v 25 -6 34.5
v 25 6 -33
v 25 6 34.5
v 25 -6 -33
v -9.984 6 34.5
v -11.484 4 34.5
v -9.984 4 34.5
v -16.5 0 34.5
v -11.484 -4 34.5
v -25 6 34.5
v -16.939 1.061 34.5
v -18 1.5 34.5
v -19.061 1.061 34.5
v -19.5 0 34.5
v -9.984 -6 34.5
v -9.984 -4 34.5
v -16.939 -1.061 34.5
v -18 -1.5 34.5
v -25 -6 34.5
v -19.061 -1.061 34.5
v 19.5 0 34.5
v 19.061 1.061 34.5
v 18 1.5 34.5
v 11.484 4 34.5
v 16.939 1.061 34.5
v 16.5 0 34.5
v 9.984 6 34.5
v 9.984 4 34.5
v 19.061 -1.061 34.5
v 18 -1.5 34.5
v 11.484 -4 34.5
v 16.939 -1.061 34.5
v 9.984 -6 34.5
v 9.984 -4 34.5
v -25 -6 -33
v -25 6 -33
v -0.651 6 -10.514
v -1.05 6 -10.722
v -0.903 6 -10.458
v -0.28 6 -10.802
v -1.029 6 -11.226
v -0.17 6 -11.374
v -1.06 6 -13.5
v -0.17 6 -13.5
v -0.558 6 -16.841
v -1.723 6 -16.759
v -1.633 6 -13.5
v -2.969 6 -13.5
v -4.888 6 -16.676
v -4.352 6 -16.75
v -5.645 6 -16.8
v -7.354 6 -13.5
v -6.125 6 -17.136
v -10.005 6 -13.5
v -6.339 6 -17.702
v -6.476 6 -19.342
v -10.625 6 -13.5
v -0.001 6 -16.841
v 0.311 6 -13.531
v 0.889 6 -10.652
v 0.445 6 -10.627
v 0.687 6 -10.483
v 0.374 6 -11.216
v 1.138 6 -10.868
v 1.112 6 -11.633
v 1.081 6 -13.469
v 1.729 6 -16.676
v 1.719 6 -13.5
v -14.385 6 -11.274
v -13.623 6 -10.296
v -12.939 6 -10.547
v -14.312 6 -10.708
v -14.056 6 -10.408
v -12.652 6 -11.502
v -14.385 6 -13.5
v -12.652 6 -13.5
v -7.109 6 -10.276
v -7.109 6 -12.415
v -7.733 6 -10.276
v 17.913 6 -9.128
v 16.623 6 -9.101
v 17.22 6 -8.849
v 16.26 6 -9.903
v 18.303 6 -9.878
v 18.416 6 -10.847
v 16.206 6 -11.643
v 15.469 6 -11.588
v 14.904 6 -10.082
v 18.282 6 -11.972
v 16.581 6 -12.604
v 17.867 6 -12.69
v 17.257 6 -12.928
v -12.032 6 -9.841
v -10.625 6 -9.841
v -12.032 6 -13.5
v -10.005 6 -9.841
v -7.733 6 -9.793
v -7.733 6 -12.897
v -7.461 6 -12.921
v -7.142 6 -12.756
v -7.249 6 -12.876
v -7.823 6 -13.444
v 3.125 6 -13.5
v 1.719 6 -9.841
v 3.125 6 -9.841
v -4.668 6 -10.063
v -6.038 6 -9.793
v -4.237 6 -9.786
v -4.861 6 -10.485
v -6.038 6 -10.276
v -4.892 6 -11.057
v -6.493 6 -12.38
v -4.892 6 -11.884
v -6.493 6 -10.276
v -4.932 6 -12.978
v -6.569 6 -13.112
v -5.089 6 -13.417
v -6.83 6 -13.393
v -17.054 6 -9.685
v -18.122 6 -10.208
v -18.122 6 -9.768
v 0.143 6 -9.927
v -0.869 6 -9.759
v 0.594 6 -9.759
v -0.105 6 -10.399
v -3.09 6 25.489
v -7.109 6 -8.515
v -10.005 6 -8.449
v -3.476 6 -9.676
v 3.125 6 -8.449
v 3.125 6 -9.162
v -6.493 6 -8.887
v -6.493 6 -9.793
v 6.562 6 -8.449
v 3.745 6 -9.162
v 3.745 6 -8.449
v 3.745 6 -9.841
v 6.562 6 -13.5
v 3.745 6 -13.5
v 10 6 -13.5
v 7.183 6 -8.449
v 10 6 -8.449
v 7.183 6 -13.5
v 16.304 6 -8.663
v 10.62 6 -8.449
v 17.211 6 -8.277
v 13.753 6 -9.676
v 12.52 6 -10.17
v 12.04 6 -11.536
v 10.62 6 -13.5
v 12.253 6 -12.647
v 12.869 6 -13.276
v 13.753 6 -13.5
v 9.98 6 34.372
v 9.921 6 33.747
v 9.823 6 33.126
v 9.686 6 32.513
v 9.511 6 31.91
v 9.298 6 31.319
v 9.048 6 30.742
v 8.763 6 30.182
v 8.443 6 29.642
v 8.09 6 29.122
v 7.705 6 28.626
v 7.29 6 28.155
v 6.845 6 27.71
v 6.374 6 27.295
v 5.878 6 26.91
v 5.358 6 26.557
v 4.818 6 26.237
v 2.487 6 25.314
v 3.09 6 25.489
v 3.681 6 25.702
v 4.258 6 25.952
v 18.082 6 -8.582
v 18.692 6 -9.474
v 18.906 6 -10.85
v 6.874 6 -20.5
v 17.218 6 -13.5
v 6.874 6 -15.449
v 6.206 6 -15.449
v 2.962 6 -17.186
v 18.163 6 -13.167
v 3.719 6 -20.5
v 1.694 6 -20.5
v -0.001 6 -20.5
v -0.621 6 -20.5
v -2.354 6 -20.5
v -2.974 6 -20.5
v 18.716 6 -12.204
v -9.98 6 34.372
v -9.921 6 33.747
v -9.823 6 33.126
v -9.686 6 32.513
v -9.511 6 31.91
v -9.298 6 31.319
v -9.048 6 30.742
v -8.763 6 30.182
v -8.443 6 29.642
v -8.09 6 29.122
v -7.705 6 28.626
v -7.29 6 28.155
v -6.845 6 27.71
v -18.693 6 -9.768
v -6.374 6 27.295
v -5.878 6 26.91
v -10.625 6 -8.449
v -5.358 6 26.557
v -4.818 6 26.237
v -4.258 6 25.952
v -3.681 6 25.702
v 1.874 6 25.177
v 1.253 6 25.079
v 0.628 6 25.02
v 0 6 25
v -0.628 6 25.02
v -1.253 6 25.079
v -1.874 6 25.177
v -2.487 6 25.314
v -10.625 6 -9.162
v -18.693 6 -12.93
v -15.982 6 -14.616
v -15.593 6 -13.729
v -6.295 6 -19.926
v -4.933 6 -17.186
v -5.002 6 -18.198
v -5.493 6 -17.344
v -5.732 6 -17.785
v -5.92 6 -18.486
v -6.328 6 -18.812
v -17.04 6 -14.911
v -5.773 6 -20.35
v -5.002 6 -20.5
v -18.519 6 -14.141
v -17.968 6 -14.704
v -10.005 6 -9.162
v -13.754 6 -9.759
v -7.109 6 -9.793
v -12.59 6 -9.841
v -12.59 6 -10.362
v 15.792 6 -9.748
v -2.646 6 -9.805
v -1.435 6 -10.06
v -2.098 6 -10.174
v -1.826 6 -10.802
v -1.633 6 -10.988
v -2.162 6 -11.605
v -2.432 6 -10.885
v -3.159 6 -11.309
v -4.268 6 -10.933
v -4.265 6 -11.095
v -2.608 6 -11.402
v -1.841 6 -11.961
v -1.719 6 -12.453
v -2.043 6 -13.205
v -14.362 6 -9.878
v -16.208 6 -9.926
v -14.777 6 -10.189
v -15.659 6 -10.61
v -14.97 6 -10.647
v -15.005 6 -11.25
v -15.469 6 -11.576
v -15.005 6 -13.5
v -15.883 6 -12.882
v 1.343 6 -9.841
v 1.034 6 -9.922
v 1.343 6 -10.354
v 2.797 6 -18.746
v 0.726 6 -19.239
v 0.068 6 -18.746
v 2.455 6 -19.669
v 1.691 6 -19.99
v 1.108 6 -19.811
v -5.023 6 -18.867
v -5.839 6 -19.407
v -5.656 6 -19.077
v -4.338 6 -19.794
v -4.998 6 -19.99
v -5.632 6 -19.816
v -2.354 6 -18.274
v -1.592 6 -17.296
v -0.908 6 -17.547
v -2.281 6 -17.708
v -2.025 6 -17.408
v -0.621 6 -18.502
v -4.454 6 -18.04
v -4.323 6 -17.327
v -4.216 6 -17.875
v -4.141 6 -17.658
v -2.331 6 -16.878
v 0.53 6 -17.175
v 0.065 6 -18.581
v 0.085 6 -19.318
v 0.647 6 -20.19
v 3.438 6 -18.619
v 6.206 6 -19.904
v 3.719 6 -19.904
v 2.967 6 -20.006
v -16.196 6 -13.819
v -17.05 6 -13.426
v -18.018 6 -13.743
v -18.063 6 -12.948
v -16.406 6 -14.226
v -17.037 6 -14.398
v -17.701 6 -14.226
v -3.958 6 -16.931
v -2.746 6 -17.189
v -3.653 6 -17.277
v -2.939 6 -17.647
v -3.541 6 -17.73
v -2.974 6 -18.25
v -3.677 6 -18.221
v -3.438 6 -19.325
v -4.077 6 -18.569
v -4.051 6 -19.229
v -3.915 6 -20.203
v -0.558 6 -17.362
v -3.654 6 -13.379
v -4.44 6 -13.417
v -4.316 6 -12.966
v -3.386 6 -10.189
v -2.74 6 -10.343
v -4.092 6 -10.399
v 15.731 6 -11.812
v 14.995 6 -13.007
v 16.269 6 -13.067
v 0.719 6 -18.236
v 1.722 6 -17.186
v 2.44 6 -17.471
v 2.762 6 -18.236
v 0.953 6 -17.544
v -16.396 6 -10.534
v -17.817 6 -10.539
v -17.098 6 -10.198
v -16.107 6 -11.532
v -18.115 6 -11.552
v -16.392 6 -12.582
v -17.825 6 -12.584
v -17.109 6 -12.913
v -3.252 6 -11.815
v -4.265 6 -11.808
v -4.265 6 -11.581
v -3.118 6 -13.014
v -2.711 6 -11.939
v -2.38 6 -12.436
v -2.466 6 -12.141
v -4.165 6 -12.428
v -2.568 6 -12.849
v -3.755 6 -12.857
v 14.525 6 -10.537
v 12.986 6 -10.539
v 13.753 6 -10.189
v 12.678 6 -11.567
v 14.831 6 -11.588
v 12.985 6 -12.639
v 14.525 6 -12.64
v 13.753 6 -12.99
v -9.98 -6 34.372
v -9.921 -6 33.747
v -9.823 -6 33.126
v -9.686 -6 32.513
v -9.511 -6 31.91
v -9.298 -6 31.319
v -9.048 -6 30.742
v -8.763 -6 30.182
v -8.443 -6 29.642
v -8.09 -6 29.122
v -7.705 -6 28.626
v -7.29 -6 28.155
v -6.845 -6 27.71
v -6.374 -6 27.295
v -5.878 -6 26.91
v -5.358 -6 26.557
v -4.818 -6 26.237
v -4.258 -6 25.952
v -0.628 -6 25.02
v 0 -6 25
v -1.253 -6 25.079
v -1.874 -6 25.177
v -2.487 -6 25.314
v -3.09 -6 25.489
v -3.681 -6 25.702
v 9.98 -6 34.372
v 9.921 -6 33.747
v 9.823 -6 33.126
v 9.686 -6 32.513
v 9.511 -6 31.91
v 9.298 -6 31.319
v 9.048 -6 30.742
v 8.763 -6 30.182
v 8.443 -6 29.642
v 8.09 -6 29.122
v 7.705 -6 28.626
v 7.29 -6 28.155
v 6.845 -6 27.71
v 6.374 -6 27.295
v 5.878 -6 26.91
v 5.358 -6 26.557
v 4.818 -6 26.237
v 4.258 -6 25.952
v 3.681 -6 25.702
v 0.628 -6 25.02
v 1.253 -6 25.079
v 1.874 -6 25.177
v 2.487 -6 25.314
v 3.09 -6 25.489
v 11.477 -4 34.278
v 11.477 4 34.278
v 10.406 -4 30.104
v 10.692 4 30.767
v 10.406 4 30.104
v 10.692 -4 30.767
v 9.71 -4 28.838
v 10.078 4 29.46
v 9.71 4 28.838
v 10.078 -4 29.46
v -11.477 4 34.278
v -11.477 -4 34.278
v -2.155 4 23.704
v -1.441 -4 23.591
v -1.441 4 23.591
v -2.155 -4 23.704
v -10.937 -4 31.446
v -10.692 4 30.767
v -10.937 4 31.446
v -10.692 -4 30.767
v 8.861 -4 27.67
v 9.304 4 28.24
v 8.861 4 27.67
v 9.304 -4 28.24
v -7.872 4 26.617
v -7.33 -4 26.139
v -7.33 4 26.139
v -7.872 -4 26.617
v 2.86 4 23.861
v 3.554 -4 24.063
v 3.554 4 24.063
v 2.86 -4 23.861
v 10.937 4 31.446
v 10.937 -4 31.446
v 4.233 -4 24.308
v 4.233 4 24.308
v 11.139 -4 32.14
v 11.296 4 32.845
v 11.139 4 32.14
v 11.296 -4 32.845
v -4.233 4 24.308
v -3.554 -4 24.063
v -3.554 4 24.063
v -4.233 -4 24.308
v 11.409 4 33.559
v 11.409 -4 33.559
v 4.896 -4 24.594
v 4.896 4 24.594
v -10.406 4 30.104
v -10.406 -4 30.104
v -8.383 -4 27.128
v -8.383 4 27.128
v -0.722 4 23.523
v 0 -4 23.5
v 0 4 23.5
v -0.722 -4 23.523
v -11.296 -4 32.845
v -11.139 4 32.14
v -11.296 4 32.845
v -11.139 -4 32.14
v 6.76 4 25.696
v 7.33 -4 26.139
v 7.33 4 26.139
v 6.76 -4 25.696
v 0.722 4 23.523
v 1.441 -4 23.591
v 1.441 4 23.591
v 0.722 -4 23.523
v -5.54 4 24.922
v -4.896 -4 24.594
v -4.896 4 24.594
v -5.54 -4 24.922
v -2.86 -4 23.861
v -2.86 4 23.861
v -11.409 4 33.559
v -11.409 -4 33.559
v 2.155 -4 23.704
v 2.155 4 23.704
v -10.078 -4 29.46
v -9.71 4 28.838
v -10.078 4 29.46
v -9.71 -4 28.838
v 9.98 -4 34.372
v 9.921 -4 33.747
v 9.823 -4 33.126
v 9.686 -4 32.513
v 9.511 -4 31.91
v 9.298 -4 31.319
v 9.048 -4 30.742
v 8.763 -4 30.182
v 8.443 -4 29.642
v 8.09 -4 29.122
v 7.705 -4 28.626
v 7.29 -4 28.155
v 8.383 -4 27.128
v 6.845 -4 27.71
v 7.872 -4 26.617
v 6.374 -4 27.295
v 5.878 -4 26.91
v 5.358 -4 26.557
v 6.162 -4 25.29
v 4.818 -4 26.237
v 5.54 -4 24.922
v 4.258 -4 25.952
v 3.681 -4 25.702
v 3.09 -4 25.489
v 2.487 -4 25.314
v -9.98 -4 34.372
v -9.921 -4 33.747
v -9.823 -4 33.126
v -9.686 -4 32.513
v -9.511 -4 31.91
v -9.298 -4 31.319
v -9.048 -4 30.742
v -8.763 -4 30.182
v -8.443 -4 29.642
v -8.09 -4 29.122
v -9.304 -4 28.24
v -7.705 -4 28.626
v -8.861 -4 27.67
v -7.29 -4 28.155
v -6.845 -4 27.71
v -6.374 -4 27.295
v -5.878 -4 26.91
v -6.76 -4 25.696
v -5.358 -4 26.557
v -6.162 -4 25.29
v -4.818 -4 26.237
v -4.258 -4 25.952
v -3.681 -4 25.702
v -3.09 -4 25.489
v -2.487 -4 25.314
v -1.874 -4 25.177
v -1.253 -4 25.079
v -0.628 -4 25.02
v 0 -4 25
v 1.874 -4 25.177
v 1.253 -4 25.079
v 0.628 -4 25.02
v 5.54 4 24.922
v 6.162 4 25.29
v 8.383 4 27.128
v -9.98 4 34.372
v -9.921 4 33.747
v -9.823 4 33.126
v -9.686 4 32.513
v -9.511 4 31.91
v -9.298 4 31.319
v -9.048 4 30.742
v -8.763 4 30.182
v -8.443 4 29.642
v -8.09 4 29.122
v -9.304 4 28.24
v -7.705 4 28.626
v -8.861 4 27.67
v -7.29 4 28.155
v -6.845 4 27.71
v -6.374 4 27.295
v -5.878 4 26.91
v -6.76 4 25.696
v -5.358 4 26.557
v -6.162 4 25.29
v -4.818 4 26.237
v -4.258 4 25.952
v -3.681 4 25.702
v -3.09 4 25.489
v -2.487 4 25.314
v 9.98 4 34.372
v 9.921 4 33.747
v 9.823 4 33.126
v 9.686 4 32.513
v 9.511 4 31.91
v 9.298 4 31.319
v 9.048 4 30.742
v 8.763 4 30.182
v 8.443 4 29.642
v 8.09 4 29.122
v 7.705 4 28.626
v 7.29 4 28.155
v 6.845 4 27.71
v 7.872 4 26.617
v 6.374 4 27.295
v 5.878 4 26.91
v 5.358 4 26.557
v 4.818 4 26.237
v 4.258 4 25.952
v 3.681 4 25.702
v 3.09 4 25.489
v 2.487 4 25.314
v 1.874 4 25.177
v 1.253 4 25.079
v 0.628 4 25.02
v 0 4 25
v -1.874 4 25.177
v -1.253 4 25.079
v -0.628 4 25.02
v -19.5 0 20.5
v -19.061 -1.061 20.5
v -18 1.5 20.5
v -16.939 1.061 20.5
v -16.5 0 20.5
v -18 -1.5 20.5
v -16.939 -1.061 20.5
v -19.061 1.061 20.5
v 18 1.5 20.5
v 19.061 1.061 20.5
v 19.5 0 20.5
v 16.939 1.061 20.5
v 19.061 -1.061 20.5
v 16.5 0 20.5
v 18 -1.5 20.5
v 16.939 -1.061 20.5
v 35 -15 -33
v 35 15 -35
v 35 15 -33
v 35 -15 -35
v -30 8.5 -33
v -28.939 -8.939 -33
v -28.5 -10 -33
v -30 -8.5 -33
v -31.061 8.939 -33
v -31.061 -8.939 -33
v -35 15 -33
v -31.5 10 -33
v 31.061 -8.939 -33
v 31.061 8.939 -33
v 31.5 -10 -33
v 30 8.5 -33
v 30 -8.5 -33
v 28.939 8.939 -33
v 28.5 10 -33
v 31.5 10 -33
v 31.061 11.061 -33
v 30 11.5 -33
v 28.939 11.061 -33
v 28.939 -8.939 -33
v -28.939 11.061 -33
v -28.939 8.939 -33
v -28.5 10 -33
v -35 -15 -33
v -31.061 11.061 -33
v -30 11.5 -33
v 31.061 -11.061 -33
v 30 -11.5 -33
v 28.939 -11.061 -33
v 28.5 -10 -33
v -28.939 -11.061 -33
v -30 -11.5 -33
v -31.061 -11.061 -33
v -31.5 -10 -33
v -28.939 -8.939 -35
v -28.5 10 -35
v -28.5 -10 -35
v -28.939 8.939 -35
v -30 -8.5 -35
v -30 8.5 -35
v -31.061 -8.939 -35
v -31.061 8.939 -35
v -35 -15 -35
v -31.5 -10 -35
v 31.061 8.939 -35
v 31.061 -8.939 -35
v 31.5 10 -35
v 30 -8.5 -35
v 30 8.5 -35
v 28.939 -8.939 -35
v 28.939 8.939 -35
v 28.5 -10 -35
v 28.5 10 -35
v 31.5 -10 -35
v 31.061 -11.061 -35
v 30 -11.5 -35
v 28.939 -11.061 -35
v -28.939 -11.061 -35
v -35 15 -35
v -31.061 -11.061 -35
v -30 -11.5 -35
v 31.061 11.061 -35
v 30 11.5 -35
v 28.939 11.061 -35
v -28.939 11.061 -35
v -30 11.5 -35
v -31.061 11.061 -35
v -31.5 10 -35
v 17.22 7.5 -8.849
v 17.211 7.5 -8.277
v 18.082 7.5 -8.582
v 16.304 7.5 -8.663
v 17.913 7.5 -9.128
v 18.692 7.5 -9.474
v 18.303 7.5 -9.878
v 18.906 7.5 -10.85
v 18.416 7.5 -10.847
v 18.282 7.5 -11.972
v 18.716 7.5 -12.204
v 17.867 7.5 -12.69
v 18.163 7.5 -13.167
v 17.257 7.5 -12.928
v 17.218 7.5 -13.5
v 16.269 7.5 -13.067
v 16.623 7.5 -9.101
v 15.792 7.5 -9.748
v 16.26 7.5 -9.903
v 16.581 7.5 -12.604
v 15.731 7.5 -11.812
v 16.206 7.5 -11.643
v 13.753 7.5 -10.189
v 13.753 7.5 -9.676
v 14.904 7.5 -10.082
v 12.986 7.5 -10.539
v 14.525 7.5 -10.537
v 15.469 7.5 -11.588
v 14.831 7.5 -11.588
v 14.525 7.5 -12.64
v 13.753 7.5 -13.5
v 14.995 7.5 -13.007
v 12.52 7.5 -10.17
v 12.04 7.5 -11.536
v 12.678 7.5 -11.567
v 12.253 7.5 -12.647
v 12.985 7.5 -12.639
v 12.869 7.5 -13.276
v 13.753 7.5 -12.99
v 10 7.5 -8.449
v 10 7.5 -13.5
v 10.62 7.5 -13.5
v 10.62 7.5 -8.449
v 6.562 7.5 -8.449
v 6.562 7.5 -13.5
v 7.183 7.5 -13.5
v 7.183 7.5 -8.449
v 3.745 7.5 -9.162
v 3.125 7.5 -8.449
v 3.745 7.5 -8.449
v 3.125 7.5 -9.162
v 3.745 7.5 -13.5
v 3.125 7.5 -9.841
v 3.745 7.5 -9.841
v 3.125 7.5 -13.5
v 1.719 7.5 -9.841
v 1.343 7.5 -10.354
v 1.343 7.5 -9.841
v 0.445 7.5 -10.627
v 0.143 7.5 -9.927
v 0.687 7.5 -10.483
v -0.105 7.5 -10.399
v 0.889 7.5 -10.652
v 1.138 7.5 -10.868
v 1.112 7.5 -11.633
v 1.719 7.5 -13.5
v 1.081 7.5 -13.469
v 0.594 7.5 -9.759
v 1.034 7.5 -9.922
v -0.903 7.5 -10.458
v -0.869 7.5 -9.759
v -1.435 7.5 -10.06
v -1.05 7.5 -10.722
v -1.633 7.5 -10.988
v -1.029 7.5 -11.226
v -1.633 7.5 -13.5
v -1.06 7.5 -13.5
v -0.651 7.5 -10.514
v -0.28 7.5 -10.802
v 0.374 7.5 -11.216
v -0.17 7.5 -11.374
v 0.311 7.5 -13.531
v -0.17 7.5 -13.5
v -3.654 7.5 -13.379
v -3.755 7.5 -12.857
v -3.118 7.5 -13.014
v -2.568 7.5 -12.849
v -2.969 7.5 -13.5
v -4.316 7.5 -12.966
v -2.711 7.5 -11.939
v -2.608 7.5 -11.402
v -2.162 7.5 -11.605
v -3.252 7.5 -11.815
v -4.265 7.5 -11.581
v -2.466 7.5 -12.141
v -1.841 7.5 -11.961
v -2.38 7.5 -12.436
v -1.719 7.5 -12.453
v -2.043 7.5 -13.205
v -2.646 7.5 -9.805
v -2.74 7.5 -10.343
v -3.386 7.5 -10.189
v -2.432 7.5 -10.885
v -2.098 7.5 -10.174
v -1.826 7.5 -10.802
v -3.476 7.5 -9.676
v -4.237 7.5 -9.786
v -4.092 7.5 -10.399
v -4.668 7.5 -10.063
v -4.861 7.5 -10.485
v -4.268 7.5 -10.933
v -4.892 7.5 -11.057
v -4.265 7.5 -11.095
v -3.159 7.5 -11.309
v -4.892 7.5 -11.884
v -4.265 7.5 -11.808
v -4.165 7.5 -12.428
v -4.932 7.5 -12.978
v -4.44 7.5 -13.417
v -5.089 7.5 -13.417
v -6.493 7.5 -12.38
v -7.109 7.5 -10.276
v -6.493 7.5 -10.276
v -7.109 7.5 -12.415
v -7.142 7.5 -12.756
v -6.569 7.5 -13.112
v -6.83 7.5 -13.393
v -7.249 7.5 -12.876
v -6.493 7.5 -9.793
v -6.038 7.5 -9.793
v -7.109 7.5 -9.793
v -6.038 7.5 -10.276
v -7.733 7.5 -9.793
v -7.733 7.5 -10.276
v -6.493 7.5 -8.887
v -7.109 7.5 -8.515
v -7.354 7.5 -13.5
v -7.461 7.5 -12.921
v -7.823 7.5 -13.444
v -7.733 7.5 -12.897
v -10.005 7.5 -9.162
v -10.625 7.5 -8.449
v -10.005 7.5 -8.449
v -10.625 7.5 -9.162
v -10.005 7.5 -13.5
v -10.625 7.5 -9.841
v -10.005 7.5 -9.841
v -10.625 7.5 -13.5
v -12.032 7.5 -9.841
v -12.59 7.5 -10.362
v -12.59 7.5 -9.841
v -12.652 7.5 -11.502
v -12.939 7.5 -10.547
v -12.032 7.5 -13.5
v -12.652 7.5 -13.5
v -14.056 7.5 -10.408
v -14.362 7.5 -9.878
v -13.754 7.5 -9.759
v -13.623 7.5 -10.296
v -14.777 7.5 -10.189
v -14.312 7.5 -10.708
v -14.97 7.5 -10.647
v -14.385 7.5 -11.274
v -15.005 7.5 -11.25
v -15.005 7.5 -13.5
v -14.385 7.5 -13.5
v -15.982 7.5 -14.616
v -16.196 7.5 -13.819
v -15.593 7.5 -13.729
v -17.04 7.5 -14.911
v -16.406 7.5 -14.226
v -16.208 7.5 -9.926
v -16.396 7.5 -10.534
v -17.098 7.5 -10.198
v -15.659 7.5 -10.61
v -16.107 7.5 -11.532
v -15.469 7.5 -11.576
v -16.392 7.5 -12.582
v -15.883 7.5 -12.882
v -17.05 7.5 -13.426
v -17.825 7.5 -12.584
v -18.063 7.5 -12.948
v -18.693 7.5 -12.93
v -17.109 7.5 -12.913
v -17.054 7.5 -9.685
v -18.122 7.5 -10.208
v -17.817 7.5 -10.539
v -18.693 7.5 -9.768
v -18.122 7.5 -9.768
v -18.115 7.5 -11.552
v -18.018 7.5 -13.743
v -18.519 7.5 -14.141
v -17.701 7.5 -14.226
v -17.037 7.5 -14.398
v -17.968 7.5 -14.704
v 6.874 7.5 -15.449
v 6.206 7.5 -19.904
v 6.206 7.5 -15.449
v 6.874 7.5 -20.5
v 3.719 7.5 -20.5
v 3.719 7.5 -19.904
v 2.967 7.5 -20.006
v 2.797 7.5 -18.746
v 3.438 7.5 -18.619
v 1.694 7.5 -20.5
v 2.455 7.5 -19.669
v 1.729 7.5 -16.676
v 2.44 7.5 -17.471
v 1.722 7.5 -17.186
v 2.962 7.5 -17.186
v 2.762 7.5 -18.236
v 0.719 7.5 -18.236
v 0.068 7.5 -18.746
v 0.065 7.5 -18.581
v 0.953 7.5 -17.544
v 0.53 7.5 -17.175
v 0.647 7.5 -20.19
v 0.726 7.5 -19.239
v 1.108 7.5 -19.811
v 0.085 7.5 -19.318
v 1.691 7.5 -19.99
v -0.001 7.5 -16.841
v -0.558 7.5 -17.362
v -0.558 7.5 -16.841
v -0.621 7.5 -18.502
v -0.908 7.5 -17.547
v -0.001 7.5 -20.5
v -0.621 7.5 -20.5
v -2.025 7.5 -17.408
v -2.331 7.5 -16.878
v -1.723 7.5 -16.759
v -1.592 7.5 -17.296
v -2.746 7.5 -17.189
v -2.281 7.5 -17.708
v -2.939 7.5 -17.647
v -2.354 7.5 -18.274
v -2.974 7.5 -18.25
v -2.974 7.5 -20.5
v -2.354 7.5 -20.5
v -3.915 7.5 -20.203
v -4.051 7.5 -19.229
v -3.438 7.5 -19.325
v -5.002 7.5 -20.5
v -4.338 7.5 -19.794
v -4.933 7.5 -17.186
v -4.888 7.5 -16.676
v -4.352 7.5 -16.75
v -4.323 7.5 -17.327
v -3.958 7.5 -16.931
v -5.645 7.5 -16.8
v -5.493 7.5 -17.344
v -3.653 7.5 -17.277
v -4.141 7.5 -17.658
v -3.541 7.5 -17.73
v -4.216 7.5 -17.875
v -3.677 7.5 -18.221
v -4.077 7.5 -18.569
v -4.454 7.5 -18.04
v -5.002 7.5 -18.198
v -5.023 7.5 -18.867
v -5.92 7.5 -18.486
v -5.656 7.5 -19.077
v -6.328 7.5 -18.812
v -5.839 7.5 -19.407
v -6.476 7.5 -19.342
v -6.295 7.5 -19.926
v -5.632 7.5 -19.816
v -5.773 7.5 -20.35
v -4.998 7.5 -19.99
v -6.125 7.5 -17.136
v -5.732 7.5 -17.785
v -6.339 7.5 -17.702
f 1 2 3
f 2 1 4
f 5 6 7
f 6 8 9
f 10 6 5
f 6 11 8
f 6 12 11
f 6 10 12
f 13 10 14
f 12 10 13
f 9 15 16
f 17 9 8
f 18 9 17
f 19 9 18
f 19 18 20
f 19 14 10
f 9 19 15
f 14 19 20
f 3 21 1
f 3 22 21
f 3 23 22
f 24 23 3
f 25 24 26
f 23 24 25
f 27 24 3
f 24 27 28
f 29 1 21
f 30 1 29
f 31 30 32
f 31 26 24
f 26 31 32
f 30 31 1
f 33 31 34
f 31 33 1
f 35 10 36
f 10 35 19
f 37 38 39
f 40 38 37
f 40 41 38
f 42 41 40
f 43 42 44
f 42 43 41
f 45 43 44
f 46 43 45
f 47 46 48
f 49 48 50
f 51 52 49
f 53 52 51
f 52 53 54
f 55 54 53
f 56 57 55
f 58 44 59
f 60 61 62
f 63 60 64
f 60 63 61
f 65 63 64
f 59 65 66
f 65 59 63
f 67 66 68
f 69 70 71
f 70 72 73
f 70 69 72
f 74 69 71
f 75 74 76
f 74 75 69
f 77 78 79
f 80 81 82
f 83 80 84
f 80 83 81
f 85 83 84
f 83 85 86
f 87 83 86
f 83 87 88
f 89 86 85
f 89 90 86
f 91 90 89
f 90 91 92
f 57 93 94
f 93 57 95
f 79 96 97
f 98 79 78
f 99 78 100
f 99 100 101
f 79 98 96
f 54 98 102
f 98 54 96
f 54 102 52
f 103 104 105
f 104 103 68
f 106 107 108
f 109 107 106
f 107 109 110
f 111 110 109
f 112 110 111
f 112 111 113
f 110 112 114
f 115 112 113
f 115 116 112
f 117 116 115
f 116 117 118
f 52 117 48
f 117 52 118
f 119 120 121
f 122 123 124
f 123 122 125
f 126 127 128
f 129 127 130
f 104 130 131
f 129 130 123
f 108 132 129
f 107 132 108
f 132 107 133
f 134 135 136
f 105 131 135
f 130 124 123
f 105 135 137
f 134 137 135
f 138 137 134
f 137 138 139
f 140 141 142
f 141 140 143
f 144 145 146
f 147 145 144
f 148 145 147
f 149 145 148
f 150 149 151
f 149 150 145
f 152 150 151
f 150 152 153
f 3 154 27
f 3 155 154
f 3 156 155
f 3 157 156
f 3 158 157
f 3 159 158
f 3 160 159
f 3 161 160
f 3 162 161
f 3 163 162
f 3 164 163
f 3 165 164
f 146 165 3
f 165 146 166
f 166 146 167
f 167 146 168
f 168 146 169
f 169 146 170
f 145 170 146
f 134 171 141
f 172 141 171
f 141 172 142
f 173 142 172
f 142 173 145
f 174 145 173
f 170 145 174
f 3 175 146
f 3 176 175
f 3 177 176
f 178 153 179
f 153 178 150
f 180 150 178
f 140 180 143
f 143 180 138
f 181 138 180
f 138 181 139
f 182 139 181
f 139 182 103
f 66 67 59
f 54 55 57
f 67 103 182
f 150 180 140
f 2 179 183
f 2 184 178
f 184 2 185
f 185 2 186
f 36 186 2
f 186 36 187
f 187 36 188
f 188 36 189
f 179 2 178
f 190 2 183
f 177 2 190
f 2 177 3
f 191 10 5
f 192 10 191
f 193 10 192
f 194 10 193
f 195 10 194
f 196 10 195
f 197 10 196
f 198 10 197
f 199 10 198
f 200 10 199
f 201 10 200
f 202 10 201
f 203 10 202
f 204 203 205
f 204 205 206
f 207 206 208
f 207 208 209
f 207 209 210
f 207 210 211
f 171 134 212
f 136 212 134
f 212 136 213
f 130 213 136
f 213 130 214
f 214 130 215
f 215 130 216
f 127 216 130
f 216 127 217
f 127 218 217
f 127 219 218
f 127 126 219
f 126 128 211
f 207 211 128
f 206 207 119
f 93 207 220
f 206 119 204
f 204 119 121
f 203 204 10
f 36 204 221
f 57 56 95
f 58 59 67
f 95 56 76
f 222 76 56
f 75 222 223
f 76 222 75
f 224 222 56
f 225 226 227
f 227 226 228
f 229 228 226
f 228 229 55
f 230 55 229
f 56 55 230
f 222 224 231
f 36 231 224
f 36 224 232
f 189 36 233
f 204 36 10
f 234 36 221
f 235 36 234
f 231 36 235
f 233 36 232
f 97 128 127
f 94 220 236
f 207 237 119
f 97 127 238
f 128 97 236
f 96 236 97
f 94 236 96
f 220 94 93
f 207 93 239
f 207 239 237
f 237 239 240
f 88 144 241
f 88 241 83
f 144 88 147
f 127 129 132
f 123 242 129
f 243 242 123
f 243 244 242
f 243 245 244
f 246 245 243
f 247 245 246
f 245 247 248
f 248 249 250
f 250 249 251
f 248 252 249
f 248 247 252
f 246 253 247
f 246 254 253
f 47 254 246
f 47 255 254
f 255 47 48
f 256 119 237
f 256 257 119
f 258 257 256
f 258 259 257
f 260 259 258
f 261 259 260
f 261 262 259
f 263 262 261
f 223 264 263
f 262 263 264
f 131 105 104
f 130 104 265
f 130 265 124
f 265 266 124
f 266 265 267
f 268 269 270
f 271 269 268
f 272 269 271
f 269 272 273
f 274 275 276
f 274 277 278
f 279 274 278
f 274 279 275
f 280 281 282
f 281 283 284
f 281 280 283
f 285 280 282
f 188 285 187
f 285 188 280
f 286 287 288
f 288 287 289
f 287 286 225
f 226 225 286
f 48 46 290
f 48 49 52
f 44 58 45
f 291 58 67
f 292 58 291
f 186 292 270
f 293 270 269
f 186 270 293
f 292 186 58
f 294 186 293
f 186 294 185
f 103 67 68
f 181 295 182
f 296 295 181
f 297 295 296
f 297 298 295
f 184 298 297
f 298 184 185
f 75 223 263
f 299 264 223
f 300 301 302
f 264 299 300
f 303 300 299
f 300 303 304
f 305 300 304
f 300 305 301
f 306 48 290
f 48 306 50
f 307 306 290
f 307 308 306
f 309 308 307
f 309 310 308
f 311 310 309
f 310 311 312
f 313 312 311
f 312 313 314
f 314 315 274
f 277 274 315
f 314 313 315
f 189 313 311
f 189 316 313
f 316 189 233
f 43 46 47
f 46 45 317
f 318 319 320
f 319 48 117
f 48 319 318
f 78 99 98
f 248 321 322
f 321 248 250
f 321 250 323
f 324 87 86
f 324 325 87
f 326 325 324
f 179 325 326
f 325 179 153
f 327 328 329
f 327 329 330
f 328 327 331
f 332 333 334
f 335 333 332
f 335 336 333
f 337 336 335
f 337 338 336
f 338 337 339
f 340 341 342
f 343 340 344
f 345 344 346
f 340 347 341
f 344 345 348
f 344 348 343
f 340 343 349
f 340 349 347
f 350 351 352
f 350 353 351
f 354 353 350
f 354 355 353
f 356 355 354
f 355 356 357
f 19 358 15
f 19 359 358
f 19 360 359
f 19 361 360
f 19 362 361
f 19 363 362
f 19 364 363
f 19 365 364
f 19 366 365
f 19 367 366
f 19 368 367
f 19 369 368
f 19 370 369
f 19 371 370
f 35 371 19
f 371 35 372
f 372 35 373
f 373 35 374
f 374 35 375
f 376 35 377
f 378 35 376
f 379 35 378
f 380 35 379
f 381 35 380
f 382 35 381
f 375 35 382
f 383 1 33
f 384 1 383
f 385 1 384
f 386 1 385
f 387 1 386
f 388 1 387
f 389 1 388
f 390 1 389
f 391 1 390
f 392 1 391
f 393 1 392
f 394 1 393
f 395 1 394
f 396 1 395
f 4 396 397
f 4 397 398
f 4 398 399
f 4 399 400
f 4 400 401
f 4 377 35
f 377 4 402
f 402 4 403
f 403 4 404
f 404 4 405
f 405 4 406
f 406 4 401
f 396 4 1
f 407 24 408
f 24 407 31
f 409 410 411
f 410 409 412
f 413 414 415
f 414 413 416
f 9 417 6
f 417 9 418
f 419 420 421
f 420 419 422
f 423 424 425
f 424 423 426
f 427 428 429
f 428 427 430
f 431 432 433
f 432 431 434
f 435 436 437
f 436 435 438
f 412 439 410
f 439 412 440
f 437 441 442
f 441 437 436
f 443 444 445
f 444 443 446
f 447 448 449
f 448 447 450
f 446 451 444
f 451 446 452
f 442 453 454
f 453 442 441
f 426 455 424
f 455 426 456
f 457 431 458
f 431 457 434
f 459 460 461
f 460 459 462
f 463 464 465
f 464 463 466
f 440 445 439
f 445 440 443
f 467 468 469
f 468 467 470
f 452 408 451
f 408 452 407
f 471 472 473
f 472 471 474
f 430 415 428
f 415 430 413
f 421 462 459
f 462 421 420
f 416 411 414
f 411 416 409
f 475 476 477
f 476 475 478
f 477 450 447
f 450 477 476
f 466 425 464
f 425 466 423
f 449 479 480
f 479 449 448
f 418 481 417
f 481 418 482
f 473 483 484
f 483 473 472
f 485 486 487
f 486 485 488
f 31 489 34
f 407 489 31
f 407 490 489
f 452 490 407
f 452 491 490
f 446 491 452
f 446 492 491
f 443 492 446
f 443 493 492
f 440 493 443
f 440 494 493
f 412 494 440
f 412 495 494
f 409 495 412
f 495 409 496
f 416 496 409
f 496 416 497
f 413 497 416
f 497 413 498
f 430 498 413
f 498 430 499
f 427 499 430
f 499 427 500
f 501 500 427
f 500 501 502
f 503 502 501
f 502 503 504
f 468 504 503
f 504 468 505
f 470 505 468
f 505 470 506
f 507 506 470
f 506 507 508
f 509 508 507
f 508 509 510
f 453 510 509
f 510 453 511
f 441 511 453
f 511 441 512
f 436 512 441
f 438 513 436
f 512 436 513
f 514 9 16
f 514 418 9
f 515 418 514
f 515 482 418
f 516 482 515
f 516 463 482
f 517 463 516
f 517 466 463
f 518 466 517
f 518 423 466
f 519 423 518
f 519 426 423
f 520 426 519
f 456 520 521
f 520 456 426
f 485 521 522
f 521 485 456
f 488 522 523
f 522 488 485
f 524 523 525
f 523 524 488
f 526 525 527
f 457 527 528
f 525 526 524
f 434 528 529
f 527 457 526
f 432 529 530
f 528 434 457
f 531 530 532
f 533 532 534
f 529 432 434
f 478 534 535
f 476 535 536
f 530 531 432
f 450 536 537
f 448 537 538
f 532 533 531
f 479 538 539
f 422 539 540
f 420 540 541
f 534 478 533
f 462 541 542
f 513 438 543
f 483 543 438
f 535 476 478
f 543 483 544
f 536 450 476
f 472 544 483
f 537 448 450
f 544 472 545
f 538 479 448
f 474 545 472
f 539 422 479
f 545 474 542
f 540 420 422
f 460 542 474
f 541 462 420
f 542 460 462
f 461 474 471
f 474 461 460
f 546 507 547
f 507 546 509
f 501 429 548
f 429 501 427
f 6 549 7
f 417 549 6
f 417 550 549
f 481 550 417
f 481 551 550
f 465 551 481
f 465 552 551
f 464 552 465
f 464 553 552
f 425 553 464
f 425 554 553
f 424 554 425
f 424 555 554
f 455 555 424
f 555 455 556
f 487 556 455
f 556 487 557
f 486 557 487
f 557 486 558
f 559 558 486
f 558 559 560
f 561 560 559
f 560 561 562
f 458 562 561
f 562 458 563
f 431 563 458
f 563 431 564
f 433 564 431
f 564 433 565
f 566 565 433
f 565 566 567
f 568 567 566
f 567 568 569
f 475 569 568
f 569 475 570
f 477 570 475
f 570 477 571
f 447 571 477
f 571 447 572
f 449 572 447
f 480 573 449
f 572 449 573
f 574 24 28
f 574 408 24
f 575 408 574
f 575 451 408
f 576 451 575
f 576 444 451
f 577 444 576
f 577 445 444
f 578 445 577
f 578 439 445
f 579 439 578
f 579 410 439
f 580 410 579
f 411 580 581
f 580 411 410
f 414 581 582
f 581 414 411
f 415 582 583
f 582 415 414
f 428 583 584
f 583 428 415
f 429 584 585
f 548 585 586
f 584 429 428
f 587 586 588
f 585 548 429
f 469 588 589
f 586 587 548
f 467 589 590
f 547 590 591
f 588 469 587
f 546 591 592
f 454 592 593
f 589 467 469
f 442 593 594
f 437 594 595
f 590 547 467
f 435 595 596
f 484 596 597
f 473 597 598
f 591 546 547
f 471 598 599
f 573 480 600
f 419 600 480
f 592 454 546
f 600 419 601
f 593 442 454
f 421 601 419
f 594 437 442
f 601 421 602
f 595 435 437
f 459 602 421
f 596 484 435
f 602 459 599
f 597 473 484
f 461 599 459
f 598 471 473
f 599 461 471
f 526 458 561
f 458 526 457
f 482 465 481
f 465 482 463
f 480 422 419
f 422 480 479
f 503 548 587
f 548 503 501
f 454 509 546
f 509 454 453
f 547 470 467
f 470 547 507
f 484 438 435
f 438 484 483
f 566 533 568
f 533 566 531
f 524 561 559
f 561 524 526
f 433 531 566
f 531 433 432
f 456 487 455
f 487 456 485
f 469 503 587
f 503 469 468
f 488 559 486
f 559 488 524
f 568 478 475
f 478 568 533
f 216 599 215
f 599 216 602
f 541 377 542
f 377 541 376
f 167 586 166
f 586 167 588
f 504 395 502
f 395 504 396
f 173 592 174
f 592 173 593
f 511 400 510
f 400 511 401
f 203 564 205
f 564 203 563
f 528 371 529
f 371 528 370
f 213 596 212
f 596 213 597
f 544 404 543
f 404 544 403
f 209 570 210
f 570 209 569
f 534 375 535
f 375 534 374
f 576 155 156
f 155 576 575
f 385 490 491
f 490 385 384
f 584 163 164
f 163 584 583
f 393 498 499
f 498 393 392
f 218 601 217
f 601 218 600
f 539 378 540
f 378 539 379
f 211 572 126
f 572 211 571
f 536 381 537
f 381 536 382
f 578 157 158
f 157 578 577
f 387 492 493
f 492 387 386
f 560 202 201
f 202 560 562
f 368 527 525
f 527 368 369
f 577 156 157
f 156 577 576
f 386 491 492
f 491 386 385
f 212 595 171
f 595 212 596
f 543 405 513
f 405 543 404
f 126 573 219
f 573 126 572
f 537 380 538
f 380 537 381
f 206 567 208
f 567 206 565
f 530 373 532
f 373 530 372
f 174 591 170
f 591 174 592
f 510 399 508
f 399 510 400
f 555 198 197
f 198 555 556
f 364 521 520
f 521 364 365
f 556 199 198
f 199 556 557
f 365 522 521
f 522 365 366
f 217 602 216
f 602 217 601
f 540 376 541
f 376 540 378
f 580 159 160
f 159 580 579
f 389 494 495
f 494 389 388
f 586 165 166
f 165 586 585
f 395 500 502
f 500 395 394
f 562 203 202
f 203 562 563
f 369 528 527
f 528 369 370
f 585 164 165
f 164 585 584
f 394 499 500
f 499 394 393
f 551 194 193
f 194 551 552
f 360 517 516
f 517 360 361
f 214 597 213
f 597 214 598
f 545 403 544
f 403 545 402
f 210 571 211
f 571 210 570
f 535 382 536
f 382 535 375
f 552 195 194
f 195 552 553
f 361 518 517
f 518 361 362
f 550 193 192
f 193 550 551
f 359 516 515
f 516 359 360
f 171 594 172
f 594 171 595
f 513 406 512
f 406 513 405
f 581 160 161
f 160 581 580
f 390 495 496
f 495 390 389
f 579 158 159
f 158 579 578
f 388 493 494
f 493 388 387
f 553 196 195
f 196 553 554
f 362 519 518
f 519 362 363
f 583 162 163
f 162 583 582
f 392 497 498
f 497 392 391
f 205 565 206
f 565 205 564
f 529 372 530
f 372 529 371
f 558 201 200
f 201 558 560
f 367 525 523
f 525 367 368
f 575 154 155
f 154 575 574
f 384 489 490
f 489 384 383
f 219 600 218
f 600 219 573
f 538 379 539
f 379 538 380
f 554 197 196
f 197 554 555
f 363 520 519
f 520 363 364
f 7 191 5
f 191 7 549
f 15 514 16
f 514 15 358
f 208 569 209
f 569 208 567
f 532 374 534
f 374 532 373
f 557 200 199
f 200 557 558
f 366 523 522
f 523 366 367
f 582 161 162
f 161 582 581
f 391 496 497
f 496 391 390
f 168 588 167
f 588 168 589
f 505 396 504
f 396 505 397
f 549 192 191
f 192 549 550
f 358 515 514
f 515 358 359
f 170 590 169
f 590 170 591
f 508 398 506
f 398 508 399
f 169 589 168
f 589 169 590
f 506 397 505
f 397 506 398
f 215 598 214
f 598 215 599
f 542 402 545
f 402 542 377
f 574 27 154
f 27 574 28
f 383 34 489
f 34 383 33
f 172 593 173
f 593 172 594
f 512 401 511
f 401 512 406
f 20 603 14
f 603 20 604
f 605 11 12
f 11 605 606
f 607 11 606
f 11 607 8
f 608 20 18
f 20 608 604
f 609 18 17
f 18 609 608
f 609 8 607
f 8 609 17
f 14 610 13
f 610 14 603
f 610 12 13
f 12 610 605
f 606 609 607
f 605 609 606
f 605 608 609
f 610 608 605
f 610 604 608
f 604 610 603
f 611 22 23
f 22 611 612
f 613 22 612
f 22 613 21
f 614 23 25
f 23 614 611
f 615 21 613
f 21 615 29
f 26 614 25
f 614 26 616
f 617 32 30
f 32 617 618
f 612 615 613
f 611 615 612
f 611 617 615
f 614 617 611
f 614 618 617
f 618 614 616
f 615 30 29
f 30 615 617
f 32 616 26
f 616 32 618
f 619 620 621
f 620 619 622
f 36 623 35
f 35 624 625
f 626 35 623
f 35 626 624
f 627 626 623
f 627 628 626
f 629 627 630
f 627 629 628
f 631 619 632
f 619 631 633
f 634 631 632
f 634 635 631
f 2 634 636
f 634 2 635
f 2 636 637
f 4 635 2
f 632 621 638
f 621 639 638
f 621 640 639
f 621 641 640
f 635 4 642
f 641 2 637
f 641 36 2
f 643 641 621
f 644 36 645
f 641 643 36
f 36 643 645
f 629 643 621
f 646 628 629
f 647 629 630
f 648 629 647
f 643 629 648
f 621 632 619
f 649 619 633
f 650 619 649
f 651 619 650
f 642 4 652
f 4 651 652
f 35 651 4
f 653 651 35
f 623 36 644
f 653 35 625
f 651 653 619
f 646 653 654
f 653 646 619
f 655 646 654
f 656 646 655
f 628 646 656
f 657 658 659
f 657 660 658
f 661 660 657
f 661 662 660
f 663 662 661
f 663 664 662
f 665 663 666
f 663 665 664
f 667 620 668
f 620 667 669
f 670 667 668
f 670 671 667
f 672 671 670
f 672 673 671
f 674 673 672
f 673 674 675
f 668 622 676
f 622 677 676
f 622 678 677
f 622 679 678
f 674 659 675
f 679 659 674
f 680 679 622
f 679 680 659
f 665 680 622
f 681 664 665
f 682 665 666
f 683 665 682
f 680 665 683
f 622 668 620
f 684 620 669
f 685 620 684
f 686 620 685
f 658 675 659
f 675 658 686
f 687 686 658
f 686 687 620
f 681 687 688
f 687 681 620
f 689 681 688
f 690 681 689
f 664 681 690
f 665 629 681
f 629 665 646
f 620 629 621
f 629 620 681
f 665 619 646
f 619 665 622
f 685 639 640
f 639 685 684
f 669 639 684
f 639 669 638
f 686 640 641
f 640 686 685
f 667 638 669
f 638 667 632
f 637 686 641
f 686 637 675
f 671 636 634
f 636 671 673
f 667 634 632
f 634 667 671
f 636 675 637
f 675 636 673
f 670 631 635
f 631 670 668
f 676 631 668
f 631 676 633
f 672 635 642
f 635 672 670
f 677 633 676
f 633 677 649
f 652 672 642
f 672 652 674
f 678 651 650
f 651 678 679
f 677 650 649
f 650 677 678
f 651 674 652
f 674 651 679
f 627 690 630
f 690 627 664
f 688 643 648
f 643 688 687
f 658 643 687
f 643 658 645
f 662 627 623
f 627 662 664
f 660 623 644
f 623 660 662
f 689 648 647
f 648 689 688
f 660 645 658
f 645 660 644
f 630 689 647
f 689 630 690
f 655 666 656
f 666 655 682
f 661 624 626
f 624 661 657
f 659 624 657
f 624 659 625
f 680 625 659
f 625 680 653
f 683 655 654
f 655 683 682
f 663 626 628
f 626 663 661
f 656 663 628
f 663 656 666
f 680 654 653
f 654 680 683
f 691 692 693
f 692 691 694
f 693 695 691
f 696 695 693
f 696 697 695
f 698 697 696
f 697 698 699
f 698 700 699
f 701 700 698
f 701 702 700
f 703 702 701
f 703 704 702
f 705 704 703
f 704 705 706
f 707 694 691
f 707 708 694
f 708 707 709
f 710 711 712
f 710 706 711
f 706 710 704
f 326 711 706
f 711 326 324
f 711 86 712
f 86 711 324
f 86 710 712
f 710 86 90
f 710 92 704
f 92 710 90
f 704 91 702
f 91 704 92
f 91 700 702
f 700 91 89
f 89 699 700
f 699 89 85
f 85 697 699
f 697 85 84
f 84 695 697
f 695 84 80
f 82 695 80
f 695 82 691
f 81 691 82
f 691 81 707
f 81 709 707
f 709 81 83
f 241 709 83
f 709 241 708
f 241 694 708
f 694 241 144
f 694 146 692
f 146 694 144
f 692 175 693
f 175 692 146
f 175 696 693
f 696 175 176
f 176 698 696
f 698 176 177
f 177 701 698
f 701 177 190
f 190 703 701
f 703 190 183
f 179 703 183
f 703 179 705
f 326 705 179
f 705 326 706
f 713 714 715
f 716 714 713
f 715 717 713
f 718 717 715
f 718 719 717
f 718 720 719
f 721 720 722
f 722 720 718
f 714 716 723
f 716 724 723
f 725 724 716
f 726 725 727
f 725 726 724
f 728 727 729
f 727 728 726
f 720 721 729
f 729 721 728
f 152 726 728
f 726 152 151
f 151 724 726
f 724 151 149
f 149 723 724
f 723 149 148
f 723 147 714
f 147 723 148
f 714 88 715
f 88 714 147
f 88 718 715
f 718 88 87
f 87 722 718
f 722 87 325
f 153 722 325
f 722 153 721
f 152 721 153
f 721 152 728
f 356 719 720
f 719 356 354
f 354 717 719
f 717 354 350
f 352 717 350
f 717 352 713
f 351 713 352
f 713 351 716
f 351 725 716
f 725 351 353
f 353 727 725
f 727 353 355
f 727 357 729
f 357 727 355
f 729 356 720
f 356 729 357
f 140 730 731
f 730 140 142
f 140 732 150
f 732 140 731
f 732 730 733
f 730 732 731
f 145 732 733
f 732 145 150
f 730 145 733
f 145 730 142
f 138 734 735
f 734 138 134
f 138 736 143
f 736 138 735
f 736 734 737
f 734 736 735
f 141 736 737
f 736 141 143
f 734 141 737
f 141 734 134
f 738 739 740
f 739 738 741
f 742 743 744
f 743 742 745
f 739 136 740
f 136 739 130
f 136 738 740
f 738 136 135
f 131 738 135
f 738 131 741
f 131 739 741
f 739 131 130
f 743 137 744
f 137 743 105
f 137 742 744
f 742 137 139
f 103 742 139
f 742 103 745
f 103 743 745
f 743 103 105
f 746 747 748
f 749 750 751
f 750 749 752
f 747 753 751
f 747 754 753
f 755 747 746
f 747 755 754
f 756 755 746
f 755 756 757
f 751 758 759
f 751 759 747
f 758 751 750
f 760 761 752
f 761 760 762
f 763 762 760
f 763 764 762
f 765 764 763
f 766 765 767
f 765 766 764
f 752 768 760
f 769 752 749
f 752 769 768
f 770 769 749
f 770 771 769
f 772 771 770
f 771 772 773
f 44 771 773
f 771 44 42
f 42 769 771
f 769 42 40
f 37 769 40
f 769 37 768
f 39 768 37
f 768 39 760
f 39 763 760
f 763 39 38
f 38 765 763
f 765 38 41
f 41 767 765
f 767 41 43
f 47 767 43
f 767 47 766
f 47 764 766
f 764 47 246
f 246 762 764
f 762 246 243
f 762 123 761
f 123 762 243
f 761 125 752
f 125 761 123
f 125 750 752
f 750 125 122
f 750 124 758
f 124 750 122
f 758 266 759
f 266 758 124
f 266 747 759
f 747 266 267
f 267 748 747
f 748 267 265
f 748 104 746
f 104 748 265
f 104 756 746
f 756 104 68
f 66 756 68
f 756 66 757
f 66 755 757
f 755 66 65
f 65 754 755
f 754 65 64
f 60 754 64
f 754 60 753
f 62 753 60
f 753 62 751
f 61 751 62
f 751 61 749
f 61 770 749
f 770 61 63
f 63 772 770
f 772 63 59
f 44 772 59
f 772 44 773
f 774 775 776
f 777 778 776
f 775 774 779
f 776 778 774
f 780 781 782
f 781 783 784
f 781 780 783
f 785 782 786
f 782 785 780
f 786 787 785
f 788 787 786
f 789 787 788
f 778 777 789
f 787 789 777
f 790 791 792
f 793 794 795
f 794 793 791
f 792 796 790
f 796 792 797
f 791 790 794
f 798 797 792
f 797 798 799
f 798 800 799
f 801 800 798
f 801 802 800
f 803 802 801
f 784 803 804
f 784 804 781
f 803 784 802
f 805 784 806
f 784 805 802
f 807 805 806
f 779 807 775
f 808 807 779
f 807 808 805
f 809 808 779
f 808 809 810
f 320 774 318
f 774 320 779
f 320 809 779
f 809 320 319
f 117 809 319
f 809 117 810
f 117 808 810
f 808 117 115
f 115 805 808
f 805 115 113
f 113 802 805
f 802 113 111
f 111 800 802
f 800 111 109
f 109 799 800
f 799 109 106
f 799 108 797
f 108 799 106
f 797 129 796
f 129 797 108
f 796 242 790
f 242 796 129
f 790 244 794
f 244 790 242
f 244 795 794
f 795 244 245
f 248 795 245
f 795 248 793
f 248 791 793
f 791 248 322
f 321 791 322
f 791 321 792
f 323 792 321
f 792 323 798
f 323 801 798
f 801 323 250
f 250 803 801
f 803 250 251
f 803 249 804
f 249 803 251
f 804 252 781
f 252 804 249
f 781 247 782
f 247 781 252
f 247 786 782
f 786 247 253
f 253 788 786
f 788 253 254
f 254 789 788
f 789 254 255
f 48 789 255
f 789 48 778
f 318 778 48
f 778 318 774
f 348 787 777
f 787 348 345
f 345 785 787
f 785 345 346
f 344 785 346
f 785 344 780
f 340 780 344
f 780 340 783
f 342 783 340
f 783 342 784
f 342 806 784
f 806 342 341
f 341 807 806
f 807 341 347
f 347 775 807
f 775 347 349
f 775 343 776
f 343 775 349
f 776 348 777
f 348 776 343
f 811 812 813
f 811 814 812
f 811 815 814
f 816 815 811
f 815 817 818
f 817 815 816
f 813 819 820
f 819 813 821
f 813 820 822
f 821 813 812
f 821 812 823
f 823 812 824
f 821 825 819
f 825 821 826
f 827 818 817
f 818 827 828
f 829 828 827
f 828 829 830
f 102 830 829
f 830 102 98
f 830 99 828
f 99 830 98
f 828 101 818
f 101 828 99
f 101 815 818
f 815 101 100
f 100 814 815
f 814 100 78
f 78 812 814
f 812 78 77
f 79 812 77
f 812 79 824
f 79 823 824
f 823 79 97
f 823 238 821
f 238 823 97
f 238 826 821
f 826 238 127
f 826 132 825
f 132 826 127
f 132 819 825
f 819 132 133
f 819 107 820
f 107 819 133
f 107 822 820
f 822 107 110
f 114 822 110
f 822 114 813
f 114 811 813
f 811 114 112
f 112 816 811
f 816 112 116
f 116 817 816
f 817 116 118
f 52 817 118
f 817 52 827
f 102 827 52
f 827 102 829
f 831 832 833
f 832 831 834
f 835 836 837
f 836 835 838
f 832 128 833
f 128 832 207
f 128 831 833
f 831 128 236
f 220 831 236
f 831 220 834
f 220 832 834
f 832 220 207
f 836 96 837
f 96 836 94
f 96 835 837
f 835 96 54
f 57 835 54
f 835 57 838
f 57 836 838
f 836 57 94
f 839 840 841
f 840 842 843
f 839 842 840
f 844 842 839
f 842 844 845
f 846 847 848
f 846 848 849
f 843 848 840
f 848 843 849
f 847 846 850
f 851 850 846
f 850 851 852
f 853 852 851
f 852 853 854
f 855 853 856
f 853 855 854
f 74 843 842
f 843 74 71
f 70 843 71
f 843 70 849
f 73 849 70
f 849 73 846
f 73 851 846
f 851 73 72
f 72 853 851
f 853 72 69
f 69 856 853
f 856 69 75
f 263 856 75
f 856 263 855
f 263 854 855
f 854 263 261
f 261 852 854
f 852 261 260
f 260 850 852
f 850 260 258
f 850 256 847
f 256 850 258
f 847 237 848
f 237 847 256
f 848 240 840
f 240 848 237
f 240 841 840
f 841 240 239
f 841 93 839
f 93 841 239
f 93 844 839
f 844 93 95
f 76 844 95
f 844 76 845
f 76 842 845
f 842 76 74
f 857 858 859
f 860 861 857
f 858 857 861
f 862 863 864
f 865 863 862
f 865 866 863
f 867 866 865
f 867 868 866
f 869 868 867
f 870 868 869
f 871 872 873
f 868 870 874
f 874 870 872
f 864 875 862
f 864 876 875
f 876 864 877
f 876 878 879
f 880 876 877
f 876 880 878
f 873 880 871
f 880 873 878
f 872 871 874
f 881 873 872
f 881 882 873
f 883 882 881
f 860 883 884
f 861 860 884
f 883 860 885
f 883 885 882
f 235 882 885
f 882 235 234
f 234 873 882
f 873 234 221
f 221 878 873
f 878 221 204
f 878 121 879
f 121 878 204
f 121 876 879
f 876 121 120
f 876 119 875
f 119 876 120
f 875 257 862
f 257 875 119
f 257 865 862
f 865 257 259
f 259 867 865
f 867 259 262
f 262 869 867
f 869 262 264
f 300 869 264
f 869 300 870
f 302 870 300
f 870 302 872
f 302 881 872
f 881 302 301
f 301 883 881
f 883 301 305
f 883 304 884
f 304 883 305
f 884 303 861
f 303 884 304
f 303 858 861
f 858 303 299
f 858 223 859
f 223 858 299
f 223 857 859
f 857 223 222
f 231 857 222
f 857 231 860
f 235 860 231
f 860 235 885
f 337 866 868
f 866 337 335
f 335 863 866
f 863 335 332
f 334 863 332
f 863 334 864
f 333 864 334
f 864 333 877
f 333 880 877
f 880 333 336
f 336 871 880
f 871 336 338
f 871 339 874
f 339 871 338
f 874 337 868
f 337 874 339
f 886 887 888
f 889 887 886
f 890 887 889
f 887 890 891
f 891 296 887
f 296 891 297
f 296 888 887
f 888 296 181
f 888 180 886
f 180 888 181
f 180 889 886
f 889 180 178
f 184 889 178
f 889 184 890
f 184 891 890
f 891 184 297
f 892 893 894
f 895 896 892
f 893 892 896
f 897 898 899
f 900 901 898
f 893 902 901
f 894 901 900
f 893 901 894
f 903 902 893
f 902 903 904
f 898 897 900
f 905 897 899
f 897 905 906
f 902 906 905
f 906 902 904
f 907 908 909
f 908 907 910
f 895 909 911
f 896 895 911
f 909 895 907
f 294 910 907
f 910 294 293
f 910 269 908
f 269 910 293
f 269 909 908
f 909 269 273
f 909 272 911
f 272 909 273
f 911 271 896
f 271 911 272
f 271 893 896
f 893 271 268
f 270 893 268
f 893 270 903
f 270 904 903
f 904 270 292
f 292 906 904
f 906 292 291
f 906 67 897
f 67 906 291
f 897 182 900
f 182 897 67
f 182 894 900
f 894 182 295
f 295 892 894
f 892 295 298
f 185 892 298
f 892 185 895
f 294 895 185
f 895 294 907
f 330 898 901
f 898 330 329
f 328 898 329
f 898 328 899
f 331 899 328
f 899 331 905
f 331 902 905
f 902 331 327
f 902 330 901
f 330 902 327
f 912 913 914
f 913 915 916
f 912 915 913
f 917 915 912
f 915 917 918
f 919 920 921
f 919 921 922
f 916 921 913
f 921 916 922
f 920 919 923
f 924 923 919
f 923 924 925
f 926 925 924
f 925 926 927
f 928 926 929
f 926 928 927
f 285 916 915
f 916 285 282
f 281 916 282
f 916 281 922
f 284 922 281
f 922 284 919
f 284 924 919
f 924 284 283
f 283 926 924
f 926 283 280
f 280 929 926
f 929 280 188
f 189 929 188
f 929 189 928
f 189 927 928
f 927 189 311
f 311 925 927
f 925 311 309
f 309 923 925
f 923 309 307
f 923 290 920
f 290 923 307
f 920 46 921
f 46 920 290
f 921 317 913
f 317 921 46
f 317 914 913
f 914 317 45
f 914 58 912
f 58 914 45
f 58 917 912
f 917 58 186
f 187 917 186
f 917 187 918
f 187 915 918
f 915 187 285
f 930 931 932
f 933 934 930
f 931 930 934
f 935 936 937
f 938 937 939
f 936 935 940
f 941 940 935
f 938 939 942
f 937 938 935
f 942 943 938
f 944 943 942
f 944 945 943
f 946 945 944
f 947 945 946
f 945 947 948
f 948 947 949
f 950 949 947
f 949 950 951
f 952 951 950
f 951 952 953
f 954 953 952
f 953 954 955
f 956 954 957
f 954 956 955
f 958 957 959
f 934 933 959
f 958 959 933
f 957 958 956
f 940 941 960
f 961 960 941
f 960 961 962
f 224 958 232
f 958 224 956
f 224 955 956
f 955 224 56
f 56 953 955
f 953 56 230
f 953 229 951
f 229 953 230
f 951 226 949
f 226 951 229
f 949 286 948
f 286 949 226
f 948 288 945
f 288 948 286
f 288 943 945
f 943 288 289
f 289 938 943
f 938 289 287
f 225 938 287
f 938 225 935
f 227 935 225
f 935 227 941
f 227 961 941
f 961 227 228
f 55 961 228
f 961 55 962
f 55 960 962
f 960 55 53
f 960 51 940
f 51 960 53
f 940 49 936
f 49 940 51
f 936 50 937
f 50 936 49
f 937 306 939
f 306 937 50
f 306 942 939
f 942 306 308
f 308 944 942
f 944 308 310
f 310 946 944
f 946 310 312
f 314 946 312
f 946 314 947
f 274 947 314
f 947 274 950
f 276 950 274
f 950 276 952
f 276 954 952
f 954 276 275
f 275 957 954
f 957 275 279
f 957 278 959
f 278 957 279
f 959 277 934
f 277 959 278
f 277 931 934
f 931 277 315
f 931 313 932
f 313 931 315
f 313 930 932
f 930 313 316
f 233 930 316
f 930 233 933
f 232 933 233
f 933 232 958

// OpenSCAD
use <write.scad>

module collimatingLensMountBottom(){
	difference(){
		//mainBody
		color([.6,.2,.9]) cube(size=[50,12,69],center=true);
		//lensHole
		translate([0,0,35]) rotate([90,0,0]) cylinder(h=8,r=11.5,$fn=100,center=true);
		translate([0,0,35]) rotate([90,0,0]) cylinder(h=14,r=10,$fn=100,center=true);
		//screwHoles
		translate([-18,0,28]) color([1,0,0]) cylinder(h=15,r=1.5,$fn=8,center=true);
		translate([18,-0,28]) color([1,0,0]) cylinder(h=15,r=1.5,$fn=8,center=true);
	}
	difference(){
		//base
		translate([0,0,-34]) color([.6,.2,.9]) cube(size=[70,30,2],center=true);
		//baseScrewholes
		translate([30,10,-34]) color([1,0,0]) cylinder(h=5,r=1.5,$fn=8,center=true);
		translate([30,-10,-34]) color([1,0,0]) cylinder(h=5,r=1.5,$fn=8,center=true);
		translate([-30,10,-34]) color([1,0,0]) cylinder(h=5,r=1.5,$fn=8,center=true);
		translate([-30,-10,-34]) color([1,0,0]) cylinder(h=5,r=1.5,$fn=8,center=true);
	}
	rotate([90,0,180]){
		translate([0,-11,6]){
			write("Collimating",h=5,t=3,center=true);
		}
	}
	rotate([90,0,180]){
		translate([0,-18,6]){
			write("Lens",h=5,t=3,center=true);
		}
	}
}

translate([0,0,0]){
	collimatingLensMountBottom();
}
